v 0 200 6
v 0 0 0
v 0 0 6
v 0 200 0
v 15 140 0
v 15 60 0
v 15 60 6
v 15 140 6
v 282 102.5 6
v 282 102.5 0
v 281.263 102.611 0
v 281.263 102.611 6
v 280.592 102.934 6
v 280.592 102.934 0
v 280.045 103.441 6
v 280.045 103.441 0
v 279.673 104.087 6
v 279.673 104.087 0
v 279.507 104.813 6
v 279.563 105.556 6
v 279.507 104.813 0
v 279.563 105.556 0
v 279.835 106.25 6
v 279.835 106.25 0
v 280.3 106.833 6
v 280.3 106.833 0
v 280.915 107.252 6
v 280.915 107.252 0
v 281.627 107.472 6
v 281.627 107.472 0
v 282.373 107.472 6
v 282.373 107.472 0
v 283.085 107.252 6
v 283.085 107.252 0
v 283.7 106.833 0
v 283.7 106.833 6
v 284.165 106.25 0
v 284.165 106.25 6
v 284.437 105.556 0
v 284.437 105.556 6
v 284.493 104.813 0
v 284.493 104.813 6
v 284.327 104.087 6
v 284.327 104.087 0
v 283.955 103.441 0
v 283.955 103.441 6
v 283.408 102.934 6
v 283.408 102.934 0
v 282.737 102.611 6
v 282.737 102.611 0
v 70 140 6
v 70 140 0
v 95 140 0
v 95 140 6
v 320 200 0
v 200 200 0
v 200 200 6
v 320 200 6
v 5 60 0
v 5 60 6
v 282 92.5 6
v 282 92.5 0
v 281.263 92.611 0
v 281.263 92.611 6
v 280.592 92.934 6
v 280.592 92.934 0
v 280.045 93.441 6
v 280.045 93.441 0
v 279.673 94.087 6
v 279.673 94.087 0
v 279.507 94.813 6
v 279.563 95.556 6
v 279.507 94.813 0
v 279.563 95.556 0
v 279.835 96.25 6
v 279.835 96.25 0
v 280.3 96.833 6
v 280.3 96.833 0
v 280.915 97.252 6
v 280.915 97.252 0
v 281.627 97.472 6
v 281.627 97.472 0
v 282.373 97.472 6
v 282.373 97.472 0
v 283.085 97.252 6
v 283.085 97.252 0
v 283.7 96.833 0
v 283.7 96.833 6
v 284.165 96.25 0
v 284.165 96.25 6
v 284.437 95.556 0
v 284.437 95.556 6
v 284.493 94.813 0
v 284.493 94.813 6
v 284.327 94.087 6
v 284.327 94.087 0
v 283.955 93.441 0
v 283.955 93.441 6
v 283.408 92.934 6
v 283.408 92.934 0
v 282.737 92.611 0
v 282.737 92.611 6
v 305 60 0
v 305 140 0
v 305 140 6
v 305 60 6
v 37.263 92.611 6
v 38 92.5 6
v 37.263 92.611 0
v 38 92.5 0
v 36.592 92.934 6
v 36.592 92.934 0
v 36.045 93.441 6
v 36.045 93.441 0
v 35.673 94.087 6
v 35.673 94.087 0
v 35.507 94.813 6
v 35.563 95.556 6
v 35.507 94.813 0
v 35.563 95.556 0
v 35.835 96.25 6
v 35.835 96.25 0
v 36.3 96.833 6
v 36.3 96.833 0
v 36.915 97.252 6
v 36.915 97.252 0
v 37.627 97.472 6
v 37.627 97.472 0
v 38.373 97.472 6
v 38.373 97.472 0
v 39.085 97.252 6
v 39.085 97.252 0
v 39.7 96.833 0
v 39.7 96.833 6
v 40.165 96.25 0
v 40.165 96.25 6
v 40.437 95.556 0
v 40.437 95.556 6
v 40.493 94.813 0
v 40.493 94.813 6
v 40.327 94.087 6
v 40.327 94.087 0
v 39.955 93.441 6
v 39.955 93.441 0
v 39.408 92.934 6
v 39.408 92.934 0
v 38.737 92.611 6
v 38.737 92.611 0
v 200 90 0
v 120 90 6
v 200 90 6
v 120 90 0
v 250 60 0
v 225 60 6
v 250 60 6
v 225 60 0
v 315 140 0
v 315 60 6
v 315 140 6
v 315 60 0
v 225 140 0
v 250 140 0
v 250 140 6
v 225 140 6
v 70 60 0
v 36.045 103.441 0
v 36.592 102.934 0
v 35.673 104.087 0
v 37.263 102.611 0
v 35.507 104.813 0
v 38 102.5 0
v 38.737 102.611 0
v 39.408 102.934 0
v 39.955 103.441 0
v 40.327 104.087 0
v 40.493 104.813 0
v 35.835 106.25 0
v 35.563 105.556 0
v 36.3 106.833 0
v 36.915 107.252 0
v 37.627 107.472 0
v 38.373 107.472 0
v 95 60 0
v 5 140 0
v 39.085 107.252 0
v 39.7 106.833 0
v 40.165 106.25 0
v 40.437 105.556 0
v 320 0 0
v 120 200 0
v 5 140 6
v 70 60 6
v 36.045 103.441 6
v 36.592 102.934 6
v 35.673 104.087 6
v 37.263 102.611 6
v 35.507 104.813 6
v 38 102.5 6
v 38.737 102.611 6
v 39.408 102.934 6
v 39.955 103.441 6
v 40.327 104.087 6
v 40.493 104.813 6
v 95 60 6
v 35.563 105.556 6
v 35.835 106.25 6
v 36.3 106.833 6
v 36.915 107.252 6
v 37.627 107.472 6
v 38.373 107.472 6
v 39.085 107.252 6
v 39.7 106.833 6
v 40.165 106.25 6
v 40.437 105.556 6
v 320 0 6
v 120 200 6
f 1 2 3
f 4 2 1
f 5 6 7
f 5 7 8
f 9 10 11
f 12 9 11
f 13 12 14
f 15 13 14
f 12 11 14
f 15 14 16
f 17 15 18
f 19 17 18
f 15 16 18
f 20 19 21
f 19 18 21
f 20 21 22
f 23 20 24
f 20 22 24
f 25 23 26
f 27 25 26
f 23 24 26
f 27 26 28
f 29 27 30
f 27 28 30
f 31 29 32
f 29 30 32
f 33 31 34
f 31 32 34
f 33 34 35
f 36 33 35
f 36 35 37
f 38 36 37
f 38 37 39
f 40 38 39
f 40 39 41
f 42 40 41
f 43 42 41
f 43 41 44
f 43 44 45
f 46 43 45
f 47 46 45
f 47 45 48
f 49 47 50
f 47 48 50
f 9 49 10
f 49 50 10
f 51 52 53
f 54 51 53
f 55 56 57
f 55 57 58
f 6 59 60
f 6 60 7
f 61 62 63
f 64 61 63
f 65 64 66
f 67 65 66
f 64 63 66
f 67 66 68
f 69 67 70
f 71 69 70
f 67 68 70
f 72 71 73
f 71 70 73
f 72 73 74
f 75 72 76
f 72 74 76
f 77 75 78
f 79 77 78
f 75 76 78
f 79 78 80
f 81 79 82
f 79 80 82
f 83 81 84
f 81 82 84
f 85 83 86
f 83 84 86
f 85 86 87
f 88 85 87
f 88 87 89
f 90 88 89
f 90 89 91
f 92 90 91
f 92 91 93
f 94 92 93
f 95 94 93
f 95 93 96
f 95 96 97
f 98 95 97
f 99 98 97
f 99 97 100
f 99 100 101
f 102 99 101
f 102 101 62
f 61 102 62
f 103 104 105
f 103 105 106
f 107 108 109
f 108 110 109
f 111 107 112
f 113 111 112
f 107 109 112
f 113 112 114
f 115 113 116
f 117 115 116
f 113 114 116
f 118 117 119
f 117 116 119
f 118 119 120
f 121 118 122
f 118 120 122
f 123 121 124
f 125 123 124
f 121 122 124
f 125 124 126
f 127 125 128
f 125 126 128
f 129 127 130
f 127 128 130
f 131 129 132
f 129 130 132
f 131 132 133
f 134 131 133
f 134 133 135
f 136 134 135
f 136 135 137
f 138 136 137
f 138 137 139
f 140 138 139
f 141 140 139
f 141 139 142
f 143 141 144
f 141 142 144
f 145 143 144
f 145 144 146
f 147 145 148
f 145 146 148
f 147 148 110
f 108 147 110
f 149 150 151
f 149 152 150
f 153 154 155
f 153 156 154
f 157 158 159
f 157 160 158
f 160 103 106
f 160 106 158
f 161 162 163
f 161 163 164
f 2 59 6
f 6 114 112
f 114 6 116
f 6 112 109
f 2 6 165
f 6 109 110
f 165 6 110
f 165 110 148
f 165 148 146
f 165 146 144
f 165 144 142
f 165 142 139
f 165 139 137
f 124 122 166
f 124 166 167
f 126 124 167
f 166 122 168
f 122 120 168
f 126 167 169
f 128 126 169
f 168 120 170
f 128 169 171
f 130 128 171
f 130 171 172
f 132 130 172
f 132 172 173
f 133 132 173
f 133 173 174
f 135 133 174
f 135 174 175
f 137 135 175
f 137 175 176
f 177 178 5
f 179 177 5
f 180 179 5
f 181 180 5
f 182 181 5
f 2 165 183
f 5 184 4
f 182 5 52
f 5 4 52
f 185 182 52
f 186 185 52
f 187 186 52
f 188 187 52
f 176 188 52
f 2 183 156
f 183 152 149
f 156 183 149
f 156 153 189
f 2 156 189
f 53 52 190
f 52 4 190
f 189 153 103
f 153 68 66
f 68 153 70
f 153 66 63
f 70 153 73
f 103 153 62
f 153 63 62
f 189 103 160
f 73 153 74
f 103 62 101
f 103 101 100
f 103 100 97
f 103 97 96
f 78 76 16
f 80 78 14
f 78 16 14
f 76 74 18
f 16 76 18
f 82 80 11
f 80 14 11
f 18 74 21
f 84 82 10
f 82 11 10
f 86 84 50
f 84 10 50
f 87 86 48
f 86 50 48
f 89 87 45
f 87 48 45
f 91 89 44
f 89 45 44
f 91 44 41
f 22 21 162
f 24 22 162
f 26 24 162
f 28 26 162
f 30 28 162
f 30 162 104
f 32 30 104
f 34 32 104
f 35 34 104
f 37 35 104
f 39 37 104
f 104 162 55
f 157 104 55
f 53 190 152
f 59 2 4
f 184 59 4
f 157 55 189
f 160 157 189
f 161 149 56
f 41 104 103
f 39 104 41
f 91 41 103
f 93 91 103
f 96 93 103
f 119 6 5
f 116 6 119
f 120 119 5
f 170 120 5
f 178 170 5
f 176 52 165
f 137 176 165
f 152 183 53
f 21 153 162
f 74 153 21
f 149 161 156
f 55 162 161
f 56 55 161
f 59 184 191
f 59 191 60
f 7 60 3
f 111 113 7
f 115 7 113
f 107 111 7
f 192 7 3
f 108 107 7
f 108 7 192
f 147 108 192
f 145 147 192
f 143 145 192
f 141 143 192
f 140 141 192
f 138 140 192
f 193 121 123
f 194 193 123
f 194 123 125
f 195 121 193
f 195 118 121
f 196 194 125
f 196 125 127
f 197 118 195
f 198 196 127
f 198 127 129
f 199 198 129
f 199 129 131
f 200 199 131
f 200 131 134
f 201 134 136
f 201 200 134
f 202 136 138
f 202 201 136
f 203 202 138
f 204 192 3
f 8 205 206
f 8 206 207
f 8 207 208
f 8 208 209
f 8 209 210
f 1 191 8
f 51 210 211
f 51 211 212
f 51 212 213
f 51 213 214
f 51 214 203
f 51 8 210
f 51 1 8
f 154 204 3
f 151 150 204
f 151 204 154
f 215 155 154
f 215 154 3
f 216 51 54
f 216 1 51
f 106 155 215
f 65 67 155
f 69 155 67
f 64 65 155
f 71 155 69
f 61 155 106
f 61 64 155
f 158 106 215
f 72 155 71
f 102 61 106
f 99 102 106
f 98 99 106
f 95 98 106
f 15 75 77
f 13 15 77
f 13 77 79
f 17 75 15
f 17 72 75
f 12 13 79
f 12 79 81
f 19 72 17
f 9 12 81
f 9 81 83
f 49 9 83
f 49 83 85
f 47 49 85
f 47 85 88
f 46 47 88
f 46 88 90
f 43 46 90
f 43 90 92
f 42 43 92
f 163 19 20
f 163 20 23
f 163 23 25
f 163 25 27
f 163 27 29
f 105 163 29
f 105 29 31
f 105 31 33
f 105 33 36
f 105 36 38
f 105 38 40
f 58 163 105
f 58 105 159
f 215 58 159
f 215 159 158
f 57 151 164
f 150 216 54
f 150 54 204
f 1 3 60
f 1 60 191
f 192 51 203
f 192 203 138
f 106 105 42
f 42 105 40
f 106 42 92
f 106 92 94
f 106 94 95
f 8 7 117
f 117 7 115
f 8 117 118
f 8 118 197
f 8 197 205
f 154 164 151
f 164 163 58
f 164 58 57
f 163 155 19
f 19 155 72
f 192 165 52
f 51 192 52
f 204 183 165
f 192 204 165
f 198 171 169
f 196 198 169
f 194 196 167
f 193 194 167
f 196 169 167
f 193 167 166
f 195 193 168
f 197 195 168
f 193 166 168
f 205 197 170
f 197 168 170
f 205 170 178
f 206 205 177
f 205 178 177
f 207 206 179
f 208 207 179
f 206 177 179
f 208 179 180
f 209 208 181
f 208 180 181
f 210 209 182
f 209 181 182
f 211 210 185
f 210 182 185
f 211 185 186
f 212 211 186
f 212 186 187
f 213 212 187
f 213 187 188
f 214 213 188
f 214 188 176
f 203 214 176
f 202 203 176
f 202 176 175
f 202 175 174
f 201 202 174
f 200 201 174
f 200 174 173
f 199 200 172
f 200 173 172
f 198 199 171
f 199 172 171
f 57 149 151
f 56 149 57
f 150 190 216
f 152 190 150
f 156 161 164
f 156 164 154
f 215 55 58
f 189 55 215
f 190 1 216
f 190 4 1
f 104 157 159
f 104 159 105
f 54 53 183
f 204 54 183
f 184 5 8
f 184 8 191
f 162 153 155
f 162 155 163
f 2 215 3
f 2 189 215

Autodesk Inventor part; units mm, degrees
ref_plane "YZ Plane" through (0, 0, 0) normal (1, 0, 0) x (0, 1, 0)
ref_plane "XZ Plane" through (0, 0, 0) normal (0, 1, 0) x (-1, 0, 0)
ref_plane "XY Plane" through (0, 0, 0) normal (0, 0, 1) x (1, 0, 0)
sketch "Skizze1" plane through (0, 0, 0) normal (0, 0, 1) x (1, 0, 0)
  line L0 (0, 0) -> (0, 200)
  line L1 (0, 200) -> (120, 200)
  line L2 (120, 200) -> (120, 90)
  line L3 (120, 90) -> (200, 90)
  line L4 (200, 90) -> (200, 200)
  line L5 (200, 200) -> (320, 200)
  line L6 (320, 200) -> (320, 0)
  line L7 (320, 0) -> (0, 0)
  line L8 (5, 60) -> (15, 60)
  line L9 (15, 60) -> (15, 140)
  line L10 (15, 140) -> (5, 140)
  line L11 (5, 140) -> (5, 60)
  line L12 (70, 140) -> (95, 140)
  line L13 (95, 140) -> (95, 60)
  line L14 (95, 60) -> (70, 60)
  line L15 (70, 60) -> (70, 140)
  line L16 (250, 140) -> (225, 140)
  line L17 (225, 140) -> (225, 60)
  line L18 (225, 60) -> (250, 60)
  line L19 (250, 60) -> (250, 140)
  line L20 (315, 140) -> (305, 140)
  line L21 (305, 140) -> (305, 60)
  line L22 (305, 60) -> (315, 60)
  line L23 (315, 60) -> (315, 140)
  dimension "d0" = 320
  dimension "d1" = 200
  dimension "d4" = 110
  dimension "d5" = 80
  dimension "d6" = 10
  dimension "d7" = 25
  dimension "d8" = 80
  dimension "d9" = 25
  dimension "d10" = 80
  dimension "d11" = 10
  dimension "d12" = 5
  dimension "d13" = 55
  dimension "d14" = 55
  dimension "d15" = 5
  dimension "d16" = 60
  dimension "d17" = 60
  dimension "d18" = 60
  dimension "d21" = 105
  dimension "d22" = 105
extrude "Extrusion1" add sketch "Skizze1" along normal blind 6
hole "Bohrung1" at (38, 105, 6) direction (0, 0, -1) diameter 5 depth 8 tip angle 118
hole "Bohrung2" at (38, 95, 6) direction (0, 0, -1) diameter 5 depth 8 tip angle 118
hole "Bohrung5" at (282, 105, 6) direction (0, 0, -1) diameter 5 depth 8 tip angle 118
hole "Bohrung6" at (282, 95, 6) direction (0, 0, -1) diameter 5 depth 8 tip angle 118
properties part number "FahrwerkbasisBsp"
